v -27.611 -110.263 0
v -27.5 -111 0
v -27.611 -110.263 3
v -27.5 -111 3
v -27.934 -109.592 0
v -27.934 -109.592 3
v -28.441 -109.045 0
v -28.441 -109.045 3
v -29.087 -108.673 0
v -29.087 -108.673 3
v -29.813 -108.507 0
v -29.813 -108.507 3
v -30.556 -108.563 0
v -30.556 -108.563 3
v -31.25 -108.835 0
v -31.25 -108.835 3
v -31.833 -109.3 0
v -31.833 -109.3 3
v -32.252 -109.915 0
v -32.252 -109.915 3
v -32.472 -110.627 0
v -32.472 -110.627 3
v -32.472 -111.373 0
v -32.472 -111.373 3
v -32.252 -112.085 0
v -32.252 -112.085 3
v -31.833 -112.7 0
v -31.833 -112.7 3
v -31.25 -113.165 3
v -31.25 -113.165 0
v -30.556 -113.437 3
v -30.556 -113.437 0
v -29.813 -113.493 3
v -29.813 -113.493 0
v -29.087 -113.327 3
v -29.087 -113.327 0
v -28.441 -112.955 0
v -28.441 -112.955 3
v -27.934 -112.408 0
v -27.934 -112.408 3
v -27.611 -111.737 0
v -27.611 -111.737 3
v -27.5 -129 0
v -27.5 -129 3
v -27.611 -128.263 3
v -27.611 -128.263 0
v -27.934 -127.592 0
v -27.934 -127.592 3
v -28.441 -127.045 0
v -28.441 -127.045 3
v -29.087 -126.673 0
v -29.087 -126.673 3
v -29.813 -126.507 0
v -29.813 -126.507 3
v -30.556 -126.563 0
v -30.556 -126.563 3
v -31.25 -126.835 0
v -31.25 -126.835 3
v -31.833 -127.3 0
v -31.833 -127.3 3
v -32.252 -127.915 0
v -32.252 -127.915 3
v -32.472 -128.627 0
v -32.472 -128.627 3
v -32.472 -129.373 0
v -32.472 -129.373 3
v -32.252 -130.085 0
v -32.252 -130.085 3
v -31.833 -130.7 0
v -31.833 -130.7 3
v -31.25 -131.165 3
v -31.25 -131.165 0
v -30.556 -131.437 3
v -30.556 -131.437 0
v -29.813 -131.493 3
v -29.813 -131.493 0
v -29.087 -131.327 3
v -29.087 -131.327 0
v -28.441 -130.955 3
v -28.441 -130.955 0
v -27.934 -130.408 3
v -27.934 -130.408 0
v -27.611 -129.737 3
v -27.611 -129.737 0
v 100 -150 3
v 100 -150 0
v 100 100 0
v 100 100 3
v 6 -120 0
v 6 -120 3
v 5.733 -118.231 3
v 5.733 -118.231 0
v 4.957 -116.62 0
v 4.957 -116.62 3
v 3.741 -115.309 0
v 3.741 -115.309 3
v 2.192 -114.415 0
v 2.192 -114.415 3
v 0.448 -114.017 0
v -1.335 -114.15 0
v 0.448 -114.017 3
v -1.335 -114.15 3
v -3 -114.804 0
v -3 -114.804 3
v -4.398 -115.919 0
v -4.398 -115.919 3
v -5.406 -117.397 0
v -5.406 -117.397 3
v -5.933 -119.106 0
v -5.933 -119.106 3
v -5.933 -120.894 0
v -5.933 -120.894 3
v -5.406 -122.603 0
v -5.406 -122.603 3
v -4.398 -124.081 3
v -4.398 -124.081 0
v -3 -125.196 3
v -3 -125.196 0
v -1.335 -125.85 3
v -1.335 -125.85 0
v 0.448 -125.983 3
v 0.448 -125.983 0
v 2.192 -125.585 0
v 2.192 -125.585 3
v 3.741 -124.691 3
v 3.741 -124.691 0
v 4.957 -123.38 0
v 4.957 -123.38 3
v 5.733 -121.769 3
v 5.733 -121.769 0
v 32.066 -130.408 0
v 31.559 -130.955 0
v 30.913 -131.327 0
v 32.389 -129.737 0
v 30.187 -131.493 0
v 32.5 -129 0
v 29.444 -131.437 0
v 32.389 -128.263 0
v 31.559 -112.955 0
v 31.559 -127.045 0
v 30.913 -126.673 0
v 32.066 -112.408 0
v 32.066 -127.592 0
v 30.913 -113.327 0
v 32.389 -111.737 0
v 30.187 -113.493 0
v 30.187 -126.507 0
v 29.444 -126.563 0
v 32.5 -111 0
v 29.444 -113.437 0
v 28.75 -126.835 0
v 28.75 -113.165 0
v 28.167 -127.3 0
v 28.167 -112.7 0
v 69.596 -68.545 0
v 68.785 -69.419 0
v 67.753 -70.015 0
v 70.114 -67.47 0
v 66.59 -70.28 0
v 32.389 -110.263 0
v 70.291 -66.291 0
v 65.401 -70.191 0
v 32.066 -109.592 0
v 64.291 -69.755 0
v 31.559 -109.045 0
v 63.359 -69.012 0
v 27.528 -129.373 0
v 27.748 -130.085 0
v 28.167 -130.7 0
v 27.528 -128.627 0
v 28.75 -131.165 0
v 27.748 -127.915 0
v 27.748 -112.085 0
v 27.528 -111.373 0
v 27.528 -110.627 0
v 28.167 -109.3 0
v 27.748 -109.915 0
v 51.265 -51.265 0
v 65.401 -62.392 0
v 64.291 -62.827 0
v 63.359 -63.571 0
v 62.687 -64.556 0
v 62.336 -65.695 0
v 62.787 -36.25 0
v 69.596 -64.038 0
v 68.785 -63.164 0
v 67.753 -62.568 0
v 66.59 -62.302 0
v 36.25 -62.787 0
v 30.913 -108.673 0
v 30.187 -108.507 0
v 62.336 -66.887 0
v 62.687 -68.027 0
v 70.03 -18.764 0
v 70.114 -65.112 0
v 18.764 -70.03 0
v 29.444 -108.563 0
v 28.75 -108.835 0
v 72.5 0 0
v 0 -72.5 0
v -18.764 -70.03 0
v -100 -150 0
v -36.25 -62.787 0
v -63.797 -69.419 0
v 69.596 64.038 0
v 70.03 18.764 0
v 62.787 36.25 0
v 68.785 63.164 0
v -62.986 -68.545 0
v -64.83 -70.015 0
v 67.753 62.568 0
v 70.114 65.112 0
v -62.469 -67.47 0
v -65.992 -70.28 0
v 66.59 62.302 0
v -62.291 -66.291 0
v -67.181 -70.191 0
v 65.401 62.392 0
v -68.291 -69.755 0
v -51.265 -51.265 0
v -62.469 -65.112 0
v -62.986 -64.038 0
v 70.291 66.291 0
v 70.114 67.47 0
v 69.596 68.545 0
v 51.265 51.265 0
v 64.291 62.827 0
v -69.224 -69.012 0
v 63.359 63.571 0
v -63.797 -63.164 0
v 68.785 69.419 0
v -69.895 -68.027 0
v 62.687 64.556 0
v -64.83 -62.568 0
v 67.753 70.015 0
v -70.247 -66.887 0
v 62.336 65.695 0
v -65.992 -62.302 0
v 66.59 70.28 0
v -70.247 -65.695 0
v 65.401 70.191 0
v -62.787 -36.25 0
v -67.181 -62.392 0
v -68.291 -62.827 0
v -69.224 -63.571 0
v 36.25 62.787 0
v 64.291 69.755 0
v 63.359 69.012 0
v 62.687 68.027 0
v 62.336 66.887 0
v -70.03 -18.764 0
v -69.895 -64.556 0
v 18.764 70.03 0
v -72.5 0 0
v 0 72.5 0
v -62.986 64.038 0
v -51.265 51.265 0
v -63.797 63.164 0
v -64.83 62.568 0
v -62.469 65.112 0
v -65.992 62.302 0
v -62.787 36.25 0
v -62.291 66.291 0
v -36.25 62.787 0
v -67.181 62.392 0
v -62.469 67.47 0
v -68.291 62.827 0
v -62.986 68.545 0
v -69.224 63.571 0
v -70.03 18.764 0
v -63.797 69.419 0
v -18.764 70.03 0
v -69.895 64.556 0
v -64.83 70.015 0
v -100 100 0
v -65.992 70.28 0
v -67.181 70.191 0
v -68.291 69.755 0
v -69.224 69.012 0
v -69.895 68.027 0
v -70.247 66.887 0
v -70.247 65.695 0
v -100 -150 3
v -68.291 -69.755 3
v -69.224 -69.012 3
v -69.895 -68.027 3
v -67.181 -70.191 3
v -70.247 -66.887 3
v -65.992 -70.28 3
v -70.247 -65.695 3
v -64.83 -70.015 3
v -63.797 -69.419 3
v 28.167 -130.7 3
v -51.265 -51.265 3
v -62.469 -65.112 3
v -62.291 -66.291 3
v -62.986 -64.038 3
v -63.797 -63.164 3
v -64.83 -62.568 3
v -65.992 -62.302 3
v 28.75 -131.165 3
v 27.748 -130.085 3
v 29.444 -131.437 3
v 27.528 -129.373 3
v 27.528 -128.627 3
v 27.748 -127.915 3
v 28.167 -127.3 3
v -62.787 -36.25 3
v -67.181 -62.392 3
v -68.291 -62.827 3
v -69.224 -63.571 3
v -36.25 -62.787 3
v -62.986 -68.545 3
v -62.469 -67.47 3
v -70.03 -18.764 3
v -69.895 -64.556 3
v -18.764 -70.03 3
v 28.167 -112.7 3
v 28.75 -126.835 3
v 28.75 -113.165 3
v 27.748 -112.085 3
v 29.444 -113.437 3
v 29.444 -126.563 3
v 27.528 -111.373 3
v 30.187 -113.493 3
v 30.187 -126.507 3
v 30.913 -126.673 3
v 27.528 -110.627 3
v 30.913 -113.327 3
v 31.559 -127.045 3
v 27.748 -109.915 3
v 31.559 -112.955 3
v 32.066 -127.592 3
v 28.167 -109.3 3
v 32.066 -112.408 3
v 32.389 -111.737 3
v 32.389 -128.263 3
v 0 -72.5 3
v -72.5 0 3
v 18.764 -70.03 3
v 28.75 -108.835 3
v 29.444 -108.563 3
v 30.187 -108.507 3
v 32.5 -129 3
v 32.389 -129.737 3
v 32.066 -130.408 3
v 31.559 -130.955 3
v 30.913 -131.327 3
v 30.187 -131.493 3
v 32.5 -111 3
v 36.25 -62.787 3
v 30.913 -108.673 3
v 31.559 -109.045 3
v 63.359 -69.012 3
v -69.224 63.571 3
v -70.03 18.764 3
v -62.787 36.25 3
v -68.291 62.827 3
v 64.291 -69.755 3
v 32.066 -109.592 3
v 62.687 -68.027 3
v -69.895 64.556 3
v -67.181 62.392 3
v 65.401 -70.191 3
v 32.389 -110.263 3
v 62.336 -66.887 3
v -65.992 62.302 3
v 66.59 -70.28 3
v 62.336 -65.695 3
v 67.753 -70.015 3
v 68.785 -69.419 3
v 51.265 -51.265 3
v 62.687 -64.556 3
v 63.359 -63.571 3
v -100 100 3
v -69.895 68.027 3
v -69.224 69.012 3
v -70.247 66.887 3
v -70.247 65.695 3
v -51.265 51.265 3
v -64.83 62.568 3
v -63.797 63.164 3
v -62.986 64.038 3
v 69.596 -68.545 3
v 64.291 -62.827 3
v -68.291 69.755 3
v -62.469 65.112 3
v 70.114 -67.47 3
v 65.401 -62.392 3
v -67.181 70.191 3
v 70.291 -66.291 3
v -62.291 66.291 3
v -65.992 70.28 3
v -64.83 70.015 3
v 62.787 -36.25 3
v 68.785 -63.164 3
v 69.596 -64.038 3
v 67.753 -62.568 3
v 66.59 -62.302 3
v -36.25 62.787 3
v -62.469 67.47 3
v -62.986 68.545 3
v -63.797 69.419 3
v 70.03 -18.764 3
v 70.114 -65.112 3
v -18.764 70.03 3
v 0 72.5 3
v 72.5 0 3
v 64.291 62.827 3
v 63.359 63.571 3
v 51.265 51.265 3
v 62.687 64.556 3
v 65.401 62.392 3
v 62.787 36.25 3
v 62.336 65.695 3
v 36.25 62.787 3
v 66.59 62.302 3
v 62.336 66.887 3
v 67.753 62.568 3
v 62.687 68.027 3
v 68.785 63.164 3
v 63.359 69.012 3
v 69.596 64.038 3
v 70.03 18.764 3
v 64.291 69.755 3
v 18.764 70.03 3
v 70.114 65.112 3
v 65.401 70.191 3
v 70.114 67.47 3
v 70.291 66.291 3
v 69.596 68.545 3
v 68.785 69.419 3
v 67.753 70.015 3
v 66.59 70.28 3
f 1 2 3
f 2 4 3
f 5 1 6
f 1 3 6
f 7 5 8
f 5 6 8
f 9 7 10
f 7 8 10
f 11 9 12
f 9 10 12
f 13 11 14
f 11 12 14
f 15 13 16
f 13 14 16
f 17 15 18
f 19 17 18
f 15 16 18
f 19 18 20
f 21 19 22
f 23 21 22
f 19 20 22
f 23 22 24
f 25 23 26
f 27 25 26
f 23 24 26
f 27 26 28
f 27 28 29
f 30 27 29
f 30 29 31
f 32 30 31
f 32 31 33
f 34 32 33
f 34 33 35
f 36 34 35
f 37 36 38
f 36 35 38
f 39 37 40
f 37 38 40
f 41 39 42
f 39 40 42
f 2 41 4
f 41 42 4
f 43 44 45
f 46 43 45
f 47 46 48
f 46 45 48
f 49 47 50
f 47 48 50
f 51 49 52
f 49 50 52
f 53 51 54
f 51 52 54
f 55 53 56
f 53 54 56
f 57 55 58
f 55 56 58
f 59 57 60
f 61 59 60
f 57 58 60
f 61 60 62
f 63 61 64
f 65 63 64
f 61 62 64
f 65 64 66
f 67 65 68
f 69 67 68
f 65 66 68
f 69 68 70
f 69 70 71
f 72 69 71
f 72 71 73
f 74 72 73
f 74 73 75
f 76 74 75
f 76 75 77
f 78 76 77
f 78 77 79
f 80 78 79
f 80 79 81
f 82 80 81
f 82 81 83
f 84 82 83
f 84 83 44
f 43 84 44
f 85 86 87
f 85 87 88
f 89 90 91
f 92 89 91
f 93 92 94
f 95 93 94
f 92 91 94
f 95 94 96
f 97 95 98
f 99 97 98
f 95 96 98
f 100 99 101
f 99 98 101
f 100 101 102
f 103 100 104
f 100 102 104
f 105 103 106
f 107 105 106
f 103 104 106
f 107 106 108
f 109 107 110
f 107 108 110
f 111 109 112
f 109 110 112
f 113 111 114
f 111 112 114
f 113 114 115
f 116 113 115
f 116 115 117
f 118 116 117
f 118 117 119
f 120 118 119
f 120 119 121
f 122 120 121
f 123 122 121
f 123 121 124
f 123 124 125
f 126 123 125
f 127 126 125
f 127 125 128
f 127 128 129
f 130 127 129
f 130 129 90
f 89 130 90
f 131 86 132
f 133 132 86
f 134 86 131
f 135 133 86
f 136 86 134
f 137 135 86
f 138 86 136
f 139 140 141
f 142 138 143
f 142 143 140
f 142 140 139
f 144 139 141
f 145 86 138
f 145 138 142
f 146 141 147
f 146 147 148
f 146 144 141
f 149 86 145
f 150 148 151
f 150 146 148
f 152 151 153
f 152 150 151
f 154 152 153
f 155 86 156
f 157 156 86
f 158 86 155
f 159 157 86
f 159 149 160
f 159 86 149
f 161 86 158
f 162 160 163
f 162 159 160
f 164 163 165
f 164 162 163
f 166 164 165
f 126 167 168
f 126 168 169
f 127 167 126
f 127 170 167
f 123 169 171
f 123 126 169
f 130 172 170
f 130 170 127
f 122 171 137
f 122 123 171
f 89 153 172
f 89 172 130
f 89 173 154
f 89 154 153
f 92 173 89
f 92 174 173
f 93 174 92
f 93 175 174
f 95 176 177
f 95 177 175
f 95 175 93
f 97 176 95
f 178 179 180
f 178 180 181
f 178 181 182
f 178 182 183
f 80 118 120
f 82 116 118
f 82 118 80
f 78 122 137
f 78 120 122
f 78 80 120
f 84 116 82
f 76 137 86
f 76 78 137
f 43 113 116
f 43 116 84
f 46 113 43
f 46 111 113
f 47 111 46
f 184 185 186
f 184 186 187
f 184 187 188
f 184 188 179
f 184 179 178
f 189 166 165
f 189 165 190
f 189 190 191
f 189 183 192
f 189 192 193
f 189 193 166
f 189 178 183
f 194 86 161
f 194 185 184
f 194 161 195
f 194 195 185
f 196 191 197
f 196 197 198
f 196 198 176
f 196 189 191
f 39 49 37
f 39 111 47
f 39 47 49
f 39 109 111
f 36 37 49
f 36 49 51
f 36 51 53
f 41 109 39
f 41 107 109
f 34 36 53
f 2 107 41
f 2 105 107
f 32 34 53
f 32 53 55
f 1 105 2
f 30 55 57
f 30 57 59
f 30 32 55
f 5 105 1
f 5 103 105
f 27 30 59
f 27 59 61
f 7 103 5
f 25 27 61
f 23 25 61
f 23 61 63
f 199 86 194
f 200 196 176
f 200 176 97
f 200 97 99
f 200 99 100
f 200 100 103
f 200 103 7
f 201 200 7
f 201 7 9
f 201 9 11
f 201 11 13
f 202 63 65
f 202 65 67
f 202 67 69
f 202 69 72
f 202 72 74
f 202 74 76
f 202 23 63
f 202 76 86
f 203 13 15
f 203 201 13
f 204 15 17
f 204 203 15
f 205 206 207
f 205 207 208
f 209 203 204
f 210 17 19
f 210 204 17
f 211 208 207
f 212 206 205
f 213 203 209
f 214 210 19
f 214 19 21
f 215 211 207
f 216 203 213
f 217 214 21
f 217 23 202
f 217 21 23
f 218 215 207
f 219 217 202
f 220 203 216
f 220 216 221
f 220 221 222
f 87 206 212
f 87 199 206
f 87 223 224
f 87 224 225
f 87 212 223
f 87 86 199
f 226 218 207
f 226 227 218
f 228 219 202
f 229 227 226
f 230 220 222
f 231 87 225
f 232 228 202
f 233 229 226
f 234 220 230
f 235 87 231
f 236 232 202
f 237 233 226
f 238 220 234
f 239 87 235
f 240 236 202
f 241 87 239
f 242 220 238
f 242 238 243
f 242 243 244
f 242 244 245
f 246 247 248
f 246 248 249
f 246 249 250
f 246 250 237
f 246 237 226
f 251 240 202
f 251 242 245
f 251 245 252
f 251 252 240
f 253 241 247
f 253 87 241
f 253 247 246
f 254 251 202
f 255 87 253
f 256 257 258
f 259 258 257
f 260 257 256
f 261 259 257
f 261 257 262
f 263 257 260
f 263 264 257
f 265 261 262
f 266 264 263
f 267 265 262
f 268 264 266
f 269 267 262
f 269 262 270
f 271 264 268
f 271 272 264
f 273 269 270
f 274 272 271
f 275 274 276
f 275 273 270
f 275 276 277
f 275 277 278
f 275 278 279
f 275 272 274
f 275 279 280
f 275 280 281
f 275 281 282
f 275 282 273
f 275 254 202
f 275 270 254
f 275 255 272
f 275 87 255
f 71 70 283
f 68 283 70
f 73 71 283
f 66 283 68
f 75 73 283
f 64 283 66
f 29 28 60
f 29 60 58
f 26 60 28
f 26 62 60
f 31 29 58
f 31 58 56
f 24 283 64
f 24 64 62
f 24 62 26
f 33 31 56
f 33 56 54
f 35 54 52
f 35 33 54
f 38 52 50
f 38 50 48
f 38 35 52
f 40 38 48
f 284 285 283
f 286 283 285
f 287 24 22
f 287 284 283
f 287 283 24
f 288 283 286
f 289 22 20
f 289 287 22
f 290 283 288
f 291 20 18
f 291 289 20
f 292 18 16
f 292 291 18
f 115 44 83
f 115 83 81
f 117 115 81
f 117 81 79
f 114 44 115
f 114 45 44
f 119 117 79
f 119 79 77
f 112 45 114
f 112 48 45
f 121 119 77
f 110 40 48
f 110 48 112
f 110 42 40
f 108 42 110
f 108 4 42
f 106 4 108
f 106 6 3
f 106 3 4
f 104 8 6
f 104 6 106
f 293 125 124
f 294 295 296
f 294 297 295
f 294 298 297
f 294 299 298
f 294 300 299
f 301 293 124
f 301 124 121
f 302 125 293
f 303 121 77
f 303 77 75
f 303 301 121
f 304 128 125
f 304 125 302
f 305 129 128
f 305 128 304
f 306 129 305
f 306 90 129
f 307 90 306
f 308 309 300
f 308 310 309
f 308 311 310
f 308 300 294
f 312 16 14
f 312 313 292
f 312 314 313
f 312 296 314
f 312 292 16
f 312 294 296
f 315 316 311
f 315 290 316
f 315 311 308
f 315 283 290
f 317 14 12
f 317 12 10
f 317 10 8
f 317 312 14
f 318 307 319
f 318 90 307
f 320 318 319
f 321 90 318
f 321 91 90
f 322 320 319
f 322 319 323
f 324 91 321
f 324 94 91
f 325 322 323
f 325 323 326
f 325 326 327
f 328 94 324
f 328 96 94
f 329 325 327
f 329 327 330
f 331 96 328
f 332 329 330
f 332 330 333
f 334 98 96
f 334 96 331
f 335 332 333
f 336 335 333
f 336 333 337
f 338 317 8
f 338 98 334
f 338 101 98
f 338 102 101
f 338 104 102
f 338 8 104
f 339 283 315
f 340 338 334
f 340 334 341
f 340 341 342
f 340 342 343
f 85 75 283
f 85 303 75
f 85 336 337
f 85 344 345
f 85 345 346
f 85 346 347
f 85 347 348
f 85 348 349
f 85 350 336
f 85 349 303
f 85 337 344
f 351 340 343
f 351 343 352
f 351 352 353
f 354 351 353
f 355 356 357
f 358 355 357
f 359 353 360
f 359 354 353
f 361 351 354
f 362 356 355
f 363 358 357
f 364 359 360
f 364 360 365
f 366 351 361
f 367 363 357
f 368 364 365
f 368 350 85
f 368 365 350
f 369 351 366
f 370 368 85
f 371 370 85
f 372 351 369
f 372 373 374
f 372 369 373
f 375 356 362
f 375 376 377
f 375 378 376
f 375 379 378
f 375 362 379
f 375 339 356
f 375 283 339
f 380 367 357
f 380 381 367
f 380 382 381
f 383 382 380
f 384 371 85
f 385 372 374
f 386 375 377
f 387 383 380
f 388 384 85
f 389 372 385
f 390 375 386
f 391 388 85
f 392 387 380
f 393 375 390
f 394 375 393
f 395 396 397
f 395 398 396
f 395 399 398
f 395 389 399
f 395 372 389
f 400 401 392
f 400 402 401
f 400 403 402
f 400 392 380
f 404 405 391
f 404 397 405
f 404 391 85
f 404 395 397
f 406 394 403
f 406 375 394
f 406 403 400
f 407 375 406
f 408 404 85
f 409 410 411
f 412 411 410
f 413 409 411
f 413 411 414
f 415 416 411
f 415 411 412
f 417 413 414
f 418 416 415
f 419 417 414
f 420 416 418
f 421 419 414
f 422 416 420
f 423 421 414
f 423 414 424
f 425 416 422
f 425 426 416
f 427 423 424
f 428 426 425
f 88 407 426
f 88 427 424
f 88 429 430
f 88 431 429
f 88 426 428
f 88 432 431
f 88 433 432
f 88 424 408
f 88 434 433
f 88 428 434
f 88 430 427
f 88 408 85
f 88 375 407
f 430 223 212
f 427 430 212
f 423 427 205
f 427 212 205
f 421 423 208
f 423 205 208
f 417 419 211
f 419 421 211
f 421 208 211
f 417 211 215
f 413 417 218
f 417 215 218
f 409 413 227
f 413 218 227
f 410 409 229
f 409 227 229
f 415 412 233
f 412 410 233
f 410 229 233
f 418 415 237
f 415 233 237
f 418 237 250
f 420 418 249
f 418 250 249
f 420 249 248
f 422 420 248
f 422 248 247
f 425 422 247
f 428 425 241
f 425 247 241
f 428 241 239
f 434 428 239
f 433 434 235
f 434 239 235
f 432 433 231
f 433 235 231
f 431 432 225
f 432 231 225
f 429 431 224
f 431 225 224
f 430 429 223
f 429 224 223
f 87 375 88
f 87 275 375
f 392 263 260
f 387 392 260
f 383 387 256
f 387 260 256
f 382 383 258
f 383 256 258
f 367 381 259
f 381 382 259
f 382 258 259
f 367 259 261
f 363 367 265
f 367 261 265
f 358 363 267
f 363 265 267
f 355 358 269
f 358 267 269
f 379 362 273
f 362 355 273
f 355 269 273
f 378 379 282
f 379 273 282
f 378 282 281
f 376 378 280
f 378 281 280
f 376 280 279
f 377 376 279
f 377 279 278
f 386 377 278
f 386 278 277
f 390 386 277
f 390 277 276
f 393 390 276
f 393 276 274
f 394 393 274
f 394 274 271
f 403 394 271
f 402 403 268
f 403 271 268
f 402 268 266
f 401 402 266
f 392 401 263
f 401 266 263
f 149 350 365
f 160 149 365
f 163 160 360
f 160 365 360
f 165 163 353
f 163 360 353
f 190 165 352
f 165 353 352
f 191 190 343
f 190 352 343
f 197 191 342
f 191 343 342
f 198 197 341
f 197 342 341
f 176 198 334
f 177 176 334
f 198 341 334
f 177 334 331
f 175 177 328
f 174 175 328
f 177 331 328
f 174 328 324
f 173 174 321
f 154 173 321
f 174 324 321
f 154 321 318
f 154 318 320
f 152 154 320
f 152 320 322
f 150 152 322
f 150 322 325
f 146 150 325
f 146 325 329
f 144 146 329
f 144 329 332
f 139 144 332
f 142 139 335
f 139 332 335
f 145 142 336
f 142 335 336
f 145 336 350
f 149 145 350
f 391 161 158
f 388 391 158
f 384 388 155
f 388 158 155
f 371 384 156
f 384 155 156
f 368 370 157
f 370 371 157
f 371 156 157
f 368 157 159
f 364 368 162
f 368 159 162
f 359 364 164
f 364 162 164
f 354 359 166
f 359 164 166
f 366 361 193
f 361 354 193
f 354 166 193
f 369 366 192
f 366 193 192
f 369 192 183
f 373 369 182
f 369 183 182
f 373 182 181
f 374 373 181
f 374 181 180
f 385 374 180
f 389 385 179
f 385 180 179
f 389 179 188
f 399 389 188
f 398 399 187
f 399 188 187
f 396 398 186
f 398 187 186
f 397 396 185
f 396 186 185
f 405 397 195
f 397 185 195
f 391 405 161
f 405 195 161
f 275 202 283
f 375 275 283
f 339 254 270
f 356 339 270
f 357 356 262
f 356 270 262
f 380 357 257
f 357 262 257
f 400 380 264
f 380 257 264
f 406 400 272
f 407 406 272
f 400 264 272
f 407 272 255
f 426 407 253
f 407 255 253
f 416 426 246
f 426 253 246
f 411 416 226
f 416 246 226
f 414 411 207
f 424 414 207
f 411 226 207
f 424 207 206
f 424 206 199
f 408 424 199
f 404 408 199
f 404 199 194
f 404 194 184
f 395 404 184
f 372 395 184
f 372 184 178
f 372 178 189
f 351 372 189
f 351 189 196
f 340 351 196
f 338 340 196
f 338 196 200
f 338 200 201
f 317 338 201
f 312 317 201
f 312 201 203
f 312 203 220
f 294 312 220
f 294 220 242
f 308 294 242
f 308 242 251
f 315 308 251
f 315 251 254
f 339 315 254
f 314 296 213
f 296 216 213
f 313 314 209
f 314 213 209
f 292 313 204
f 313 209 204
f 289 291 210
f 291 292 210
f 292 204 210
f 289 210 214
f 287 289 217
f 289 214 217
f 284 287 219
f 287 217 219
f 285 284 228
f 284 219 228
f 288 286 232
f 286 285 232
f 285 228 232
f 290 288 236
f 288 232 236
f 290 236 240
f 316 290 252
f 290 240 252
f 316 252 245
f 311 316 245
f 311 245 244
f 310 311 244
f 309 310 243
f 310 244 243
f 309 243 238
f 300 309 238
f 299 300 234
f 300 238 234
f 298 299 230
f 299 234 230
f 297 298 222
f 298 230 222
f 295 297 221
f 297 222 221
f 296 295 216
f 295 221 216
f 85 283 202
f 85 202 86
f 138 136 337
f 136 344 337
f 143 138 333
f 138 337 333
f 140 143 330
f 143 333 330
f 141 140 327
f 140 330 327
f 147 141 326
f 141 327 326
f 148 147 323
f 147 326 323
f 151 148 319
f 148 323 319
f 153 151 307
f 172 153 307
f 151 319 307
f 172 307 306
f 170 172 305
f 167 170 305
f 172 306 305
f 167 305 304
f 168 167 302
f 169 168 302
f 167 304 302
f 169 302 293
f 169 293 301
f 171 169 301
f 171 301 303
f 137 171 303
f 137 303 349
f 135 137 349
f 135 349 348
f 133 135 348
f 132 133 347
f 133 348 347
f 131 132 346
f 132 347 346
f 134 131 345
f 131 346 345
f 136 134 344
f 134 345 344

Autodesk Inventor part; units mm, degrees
ref_plane "YZ Plane" through (0, 0, 0) normal (1, 0, 0) x (0, 1, 0)
ref_plane "XZ Plane" through (0, 0, 0) normal (0, 1, 0) x (-1, 0, 0)
ref_plane "XY Plane" through (0, 0, 0) normal (0, 0, 1) x (1, 0, 0)
sketch "スケッチ1" plane through (0, 0, 0) normal (0, 0, 1) x (1, 0, 0)
  line L0 (-100, 100) -> (100, 100)
  line L1 (100, 100) -> (100, -100)
  line L2 (100, -100) -> (-100, -100)
  line L3 (-100, -100) -> (-100, 100)
  line L4 (-100, 100) -> (100, -100) construction
  line L5 (100, 100) -> (-100, -100) construction
  circle A0 centre (0, 0) radius 93.75 construction
  circle A1 centre (-66.2913, 66.2913) radius 4
  circle A2 centre (66.2913, 66.2913) radius 4
  circle A3 centre (66.2913, -66.2913) radius 4
  circle A4 centre (-66.2913, -66.2913) radius 4
  dimension "d0" = 200
  dimension "d1" = 200
  dimension "d2" = 187.5
  dimension "d3" = 8
  dimension "d4" = 8
  dimension "d5" = 8
  dimension "d6" = 8
extrude "押し出し1" add sketch "スケッチ1" along normal blind 3
sketch "スケッチ2" plane through (0, 0, 0) normal (0, 0, -1) x (-1, 0, 0)
  circle A0 centre (0, 0) radius 72.5
  dimension "d9" = 145
extrude "押し出し2" cut sketch "スケッチ2" against normal blind 10
sketch "スケッチ3" plane through (0, 0, 3) normal (0, 0, 1) x (1, 0, 0)
  circle A0 centre (-66.2913, -66.2913) radius 4 projected
  circle A1 centre (66.2913, -66.2913) radius 4 projected
  point P0 (0, 0)
sketch "スケッチ4" plane through (-100, -100, 0) normal (0, -1, 0) x (1, 0, 0)
  line L0 (0, 0) -> (0, 3) projected
  line L1 (200, 0) -> (200, 3) projected
  line L2 (0, 3) -> (200, 3)
  line L3 (200, 3) -> (200, 0)
  line L4 (200, 0) -> (0, 0)
  line L5 (0, 0) -> (0, 3)
  point P0 (100, 0)
extrude "押し出し3" add sketch "スケッチ4" along normal blind 50
sketch "スケッチ5" plane through (0, 0, 3) normal (0, 0, 1) x (1, 0, 0)
  circle A0 centre (0, -120) radius 6
  point P0 (0, 0)
  dimension "d14" = 12
extrude "押し出し4" cut sketch "スケッチ5" against normal blind 100
sketch "スケッチ6" plane through (0, 0, 3) normal (0, 0, 1) x (1, 0, 0)
  circle A0 centre (0, -120) radius 6 projected
  line L0 (0, -120) -> (-30, -120)
  line L1 (-30, -120) -> (30, -120)
  line L2 (30, -120) -> (30, -111)
  line L3 (30, -111) -> (30, -129)
  line L4 (30, -129) -> (-30, -111)
  line L5 (-30, -111) -> (-30, -129)
  circle A1 centre (-30, -111) radius 2.5
  circle A2 centre (-30, -129) radius 2.5
  circle A3 centre (30, -111) radius 2.5
  circle A4 centre (30, -129) radius 2.5
  point P0 (0, 0)
  dimension "d17" = 30
  dimension "d18" = 60
  dimension "d19" = 9
  dimension "d20" = 90
  dimension "d21" = 18
  dimension "d22" = 5
  dimension "d23" = 5
  dimension "d24" = 5
  dimension "d25" = 5
extrude "押し出し5" cut sketch "スケッチ6" against normal blind 100 contours A3 | A2 | A1 L5 L4 | L4 L5 A1 | A4 L3 L4 | L4 L3 A4
properties part number "ベアリング板" material "アルミニウム 6061"
